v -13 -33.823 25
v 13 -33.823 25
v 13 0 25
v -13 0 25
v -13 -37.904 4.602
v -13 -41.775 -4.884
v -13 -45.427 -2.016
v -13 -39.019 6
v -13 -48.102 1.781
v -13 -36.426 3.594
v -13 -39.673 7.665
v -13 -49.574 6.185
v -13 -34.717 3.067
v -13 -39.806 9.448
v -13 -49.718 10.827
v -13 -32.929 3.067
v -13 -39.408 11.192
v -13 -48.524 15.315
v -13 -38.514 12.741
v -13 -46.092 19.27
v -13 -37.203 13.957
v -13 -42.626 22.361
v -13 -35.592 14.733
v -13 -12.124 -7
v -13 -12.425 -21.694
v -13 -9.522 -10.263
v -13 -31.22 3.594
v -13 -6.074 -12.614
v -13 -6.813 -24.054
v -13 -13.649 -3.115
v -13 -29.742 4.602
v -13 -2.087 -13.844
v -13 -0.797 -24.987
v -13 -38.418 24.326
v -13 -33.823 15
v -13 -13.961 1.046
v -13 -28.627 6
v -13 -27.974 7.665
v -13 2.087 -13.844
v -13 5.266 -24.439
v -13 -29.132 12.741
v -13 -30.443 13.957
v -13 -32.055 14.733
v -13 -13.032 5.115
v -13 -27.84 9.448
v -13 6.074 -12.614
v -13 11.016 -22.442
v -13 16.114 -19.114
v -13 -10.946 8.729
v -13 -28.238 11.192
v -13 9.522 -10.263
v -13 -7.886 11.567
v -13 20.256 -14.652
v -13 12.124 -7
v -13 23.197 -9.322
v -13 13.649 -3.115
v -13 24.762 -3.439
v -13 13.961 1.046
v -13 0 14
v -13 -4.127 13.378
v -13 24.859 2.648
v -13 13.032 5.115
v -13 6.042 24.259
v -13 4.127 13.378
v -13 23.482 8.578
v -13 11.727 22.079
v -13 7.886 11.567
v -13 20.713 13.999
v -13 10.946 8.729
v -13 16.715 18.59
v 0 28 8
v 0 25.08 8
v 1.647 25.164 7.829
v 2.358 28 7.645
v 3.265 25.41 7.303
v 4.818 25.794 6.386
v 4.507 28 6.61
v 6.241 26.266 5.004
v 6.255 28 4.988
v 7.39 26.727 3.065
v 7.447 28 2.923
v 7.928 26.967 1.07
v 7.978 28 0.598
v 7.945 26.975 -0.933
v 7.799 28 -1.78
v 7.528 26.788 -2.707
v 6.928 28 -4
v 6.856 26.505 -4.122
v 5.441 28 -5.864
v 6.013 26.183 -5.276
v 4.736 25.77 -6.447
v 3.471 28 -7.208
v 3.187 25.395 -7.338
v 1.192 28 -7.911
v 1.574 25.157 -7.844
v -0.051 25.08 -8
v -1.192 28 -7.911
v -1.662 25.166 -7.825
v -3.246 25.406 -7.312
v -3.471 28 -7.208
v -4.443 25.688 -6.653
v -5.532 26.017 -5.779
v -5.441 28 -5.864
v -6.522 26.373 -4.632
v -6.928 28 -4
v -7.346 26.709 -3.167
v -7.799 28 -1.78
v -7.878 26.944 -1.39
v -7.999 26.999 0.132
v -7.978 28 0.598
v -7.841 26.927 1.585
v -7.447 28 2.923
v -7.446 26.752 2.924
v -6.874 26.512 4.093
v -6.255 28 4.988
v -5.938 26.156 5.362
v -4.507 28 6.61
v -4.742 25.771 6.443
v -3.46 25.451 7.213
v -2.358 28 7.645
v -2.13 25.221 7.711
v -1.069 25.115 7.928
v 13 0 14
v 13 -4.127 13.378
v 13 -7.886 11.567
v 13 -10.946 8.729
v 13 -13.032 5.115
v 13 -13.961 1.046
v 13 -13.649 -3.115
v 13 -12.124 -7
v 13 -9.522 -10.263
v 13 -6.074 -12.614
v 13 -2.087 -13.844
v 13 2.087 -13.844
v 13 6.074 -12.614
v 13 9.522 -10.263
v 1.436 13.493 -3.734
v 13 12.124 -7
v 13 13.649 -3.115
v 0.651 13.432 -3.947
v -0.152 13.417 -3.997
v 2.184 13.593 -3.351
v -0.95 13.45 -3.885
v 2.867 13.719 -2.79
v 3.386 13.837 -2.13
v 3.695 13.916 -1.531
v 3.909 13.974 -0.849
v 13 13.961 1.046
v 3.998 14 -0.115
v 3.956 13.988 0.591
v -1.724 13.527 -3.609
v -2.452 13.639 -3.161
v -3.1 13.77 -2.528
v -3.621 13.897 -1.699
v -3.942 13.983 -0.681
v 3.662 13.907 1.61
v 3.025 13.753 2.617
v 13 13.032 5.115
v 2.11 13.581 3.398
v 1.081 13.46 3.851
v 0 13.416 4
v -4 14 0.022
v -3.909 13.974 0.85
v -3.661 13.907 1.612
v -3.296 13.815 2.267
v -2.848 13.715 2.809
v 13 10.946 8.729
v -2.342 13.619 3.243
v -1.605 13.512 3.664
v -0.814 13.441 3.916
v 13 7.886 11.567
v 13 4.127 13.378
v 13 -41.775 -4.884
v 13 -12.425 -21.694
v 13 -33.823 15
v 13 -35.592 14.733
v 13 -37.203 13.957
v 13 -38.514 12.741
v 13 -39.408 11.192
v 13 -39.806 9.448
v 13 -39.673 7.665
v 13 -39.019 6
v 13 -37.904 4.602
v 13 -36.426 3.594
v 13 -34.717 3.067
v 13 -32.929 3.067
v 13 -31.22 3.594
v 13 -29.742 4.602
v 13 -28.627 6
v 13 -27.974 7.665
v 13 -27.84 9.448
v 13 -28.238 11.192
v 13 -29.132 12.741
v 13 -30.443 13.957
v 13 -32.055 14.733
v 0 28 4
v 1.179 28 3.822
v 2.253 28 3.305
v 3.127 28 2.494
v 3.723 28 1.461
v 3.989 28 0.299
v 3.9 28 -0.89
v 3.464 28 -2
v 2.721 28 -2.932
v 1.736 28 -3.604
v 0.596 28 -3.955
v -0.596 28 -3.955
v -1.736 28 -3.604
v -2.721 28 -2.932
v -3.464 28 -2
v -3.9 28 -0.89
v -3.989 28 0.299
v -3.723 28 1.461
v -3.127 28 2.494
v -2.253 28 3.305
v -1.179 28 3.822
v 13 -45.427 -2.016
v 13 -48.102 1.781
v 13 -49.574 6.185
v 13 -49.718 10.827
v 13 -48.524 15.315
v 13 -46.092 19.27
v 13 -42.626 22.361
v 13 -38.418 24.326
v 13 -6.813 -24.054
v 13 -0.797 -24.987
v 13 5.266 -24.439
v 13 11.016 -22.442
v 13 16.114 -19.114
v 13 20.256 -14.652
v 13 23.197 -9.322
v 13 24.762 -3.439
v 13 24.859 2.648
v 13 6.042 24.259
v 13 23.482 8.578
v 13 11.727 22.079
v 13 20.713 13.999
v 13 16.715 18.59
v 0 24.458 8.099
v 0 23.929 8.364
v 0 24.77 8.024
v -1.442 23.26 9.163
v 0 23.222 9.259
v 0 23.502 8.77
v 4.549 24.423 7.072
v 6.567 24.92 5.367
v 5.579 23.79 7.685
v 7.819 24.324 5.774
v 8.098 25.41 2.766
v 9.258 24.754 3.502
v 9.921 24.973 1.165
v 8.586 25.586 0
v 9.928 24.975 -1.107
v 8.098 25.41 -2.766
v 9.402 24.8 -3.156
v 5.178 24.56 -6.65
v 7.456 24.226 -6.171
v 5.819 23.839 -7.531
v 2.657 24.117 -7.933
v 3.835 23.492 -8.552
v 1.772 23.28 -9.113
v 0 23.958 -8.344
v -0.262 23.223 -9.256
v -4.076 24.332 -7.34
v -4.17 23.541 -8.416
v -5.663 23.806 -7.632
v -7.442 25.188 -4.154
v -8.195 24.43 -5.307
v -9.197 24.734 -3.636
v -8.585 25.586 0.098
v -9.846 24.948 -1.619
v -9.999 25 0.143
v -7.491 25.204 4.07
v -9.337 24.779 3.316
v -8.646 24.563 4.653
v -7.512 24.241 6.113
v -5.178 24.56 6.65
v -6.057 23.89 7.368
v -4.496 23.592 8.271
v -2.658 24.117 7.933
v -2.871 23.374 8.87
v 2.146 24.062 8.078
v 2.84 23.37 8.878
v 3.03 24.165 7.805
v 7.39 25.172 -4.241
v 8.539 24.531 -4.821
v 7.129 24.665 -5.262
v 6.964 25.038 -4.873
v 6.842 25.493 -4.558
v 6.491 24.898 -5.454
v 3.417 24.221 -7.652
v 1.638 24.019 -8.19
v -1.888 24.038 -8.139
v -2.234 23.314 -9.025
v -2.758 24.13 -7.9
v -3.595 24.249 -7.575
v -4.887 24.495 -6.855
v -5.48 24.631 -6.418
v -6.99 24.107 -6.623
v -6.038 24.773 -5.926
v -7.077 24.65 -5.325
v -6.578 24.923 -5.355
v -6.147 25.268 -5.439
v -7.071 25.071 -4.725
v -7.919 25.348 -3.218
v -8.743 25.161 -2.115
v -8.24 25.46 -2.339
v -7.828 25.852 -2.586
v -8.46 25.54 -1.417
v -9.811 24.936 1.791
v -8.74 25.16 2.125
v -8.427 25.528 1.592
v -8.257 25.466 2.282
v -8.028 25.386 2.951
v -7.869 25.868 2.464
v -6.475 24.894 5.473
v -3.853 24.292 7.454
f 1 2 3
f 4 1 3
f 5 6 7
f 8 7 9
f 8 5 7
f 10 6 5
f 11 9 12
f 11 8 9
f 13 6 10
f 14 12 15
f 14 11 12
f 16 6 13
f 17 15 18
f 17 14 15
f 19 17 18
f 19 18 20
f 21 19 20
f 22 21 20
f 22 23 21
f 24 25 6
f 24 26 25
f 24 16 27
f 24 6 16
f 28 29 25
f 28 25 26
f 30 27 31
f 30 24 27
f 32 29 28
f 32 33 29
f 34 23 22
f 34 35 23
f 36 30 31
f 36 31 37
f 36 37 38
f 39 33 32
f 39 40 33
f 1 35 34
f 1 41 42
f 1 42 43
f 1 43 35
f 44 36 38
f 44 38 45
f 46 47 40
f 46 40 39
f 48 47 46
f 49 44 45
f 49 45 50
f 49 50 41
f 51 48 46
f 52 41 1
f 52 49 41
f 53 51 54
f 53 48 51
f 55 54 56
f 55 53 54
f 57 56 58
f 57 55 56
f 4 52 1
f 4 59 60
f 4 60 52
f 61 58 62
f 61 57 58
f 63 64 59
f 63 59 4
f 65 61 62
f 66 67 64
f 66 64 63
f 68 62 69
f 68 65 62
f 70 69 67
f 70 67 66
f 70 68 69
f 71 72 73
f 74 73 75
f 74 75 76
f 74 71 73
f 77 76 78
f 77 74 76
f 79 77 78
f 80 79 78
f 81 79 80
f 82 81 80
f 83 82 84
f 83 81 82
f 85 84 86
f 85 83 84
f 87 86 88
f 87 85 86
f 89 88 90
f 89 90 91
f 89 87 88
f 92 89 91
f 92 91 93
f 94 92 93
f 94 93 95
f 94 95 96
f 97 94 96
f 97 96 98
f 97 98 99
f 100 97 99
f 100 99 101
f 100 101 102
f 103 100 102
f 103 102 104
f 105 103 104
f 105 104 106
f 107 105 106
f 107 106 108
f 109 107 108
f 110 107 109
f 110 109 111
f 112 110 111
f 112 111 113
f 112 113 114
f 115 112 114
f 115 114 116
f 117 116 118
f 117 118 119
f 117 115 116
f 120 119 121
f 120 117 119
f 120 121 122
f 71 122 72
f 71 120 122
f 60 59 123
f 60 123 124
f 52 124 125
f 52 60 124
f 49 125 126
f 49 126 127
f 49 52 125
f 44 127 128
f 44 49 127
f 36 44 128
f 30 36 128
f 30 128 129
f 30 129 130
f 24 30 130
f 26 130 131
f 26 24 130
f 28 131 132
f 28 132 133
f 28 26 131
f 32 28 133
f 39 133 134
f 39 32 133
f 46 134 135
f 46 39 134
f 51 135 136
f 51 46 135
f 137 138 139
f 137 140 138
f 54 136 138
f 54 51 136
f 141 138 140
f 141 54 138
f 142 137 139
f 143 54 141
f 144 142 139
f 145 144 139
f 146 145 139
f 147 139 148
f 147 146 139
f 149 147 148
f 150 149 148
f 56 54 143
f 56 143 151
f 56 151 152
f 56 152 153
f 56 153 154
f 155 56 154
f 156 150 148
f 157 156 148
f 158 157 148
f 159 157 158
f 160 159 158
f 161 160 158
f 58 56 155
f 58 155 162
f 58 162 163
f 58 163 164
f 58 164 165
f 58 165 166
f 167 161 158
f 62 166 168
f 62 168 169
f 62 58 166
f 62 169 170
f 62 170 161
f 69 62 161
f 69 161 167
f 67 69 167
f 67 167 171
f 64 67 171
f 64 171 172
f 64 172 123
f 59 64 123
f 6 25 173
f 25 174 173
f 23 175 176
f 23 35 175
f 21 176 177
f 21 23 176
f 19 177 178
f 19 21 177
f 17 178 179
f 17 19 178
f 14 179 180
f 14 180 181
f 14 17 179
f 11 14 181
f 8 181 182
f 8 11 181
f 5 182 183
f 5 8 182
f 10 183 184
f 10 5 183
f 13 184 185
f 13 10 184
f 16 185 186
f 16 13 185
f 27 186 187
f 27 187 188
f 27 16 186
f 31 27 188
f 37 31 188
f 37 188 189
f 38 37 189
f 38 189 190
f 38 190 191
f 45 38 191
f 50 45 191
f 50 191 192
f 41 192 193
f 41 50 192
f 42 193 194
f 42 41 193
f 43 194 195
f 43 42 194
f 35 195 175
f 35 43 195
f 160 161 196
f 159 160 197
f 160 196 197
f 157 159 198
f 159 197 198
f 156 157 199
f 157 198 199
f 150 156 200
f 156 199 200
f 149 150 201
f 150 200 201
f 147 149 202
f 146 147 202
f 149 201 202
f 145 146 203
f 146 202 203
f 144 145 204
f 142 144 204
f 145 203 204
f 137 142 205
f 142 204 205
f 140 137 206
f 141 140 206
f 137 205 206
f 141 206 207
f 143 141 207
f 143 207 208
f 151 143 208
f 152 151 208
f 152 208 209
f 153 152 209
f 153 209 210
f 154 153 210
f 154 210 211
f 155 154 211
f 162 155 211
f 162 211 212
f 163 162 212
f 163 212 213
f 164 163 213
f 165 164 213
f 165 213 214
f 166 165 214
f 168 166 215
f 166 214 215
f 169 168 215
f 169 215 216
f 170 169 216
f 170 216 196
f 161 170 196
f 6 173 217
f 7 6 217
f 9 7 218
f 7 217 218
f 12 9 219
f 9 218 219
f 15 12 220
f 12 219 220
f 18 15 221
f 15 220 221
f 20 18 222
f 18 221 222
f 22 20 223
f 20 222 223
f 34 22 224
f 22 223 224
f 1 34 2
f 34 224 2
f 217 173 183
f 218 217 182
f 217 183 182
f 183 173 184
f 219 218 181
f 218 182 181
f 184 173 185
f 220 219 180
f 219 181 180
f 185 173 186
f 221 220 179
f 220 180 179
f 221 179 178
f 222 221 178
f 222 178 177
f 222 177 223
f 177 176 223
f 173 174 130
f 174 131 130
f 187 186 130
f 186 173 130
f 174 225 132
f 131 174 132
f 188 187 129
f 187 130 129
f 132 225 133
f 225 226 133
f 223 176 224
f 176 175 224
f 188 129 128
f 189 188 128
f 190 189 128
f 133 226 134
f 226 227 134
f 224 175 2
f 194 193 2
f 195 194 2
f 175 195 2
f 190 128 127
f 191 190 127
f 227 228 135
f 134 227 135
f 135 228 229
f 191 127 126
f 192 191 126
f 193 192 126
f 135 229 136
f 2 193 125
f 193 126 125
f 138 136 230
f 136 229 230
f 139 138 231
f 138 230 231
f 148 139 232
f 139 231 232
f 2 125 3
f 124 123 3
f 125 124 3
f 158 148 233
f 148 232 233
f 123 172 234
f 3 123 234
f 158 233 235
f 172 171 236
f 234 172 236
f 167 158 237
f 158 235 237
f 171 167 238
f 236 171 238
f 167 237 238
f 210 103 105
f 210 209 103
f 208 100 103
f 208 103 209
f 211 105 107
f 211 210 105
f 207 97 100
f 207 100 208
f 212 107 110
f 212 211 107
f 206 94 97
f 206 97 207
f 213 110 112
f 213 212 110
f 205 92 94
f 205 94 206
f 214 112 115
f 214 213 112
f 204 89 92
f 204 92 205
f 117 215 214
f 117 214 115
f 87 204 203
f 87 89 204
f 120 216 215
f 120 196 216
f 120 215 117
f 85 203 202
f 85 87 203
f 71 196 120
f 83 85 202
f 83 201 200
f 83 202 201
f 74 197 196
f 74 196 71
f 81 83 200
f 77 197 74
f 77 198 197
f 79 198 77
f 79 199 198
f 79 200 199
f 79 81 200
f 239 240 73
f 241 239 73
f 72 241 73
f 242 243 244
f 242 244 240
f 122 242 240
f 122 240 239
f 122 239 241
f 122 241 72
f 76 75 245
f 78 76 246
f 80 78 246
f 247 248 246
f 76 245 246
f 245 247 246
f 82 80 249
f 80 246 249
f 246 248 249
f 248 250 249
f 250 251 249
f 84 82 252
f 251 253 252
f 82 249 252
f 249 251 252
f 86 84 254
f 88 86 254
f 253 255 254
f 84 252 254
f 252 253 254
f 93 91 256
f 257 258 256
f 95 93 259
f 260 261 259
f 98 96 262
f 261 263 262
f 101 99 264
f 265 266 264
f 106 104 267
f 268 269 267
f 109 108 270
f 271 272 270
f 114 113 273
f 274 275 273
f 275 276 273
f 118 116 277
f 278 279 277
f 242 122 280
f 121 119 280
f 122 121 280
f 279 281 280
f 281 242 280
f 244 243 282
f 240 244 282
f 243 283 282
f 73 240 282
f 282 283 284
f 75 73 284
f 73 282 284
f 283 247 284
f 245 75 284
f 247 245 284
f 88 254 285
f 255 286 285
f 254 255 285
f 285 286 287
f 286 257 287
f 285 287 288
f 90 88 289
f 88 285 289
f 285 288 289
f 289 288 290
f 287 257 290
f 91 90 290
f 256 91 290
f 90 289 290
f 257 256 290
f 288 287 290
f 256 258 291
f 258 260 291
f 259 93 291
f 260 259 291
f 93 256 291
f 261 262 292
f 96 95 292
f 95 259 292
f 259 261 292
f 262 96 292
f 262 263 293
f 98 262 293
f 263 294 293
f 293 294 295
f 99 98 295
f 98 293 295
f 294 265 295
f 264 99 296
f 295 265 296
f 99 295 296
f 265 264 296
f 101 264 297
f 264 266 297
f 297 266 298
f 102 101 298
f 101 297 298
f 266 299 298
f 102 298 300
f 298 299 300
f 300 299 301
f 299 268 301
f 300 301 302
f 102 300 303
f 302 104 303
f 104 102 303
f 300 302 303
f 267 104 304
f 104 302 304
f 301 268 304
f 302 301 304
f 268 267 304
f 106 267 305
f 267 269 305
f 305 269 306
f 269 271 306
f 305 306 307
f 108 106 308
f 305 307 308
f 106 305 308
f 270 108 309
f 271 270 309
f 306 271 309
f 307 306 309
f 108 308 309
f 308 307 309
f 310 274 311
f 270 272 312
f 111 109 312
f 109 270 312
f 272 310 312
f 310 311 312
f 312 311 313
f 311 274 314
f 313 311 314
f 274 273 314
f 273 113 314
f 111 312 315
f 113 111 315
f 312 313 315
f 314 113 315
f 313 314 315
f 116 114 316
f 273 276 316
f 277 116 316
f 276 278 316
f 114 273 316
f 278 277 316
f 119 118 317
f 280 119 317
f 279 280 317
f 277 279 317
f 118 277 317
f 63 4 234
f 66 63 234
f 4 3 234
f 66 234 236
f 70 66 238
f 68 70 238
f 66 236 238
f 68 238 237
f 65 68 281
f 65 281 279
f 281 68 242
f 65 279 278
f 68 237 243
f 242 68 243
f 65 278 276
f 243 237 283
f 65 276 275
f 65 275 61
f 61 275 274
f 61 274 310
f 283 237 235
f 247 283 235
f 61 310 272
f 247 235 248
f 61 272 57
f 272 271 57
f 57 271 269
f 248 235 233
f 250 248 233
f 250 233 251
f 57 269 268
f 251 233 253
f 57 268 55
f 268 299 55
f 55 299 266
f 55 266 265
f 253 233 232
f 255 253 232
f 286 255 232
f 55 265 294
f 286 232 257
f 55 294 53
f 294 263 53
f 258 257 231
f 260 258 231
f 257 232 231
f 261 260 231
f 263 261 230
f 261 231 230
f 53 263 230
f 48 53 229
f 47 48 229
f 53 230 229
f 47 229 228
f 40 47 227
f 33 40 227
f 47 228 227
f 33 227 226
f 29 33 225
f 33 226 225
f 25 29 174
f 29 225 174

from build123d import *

# Parameters (mm, degrees)
SKETCH_1_R               = 14
SKETCH_1_R_2             = 6
EXTRUDE_1_DEPTH          = 13
EXTRUDE_2_REACH          = 84.767
EXTRUDE_2_END_RADIUS     = 25
SKETCH_2_R               = 8
CUT_EXTRUDE_3_REACH      = 84.767
CUT_EXTRUDE_3_END_RADIUS = 14
SKETCH_3_R               = 4
FILLET_1_R               = 2


with BuildPart() as part:
    # 草圖1 → 伸長1 (new, symmetric)
    with BuildSketch(Plane(origin=(0, 0, 0), x_dir=(0, 0, -1), z_dir=(1, 0, 0))):
        with BuildLine():
            Line((-25, -33.823069051), (-25, 0))
            ThreePointArc((-25, 0), (6.428571429, 24.159335036), (21.693877551, -12.424800876))
            Line((21.693877551, -12.424800876), (4.884081633, -41.774941611))
            ThreePointArc((4.884081633, -41.774941611), (-13.114285714, -49.285043474), (-25, -33.823069051))
        make_face()
        with Locations(Location((0, 0, 0), (0, 0, 180))):
            Circle(SKETCH_1_R, mode=Mode.SUBTRACT)
        with Locations(Location((-9, -33.823069051, 0), (0, 0, 180))):
            Circle(SKETCH_1_R_2, mode=Mode.SUBTRACT)
    extrude(amount=EXTRUDE_1_DEPTH, both=True)

    # 伸長2: up to this cylinder (the profile starts outside it)
    extrude_2_end = Plane(origin=(0, 0, 0), z_dir=(-1, 0, 0)) * Cylinder(EXTRUDE_2_END_RADIUS, 220.534, mode=Mode.PRIVATE)
    # 草圖2 → 伸長2 (add, up to the surface)
    with BuildSketch(Plane(origin=(0, 28, 0), x_dir=(-1, 0, 0), z_dir=(0, 1, 0)), mode=Mode.PRIVATE) as extrude_2_sk1:
        with Locations(Location((0, 0, 0), (0, 0, 90))):
            Circle(SKETCH_2_R)
    extrude_2_tool1 = extrude(extrude_2_sk1.sketch, amount=-EXTRUDE_2_REACH, mode=Mode.PRIVATE) - extrude_2_end
    add(extrude_2_tool1.solids().sort_by_distance((0, 28, 0))[0])

    # 伸長3: up to this cylinder (the profile starts outside it)
    cut_extrude_3_end = Plane(origin=(0, 0, 0), z_dir=(-1, 0, 0)) * Cylinder(CUT_EXTRUDE_3_END_RADIUS, 198.534, mode=Mode.PRIVATE)
    # 草圖3 → 伸長3 (cut, up to the surface)
    with BuildSketch(Plane(origin=(0, 28, 0), x_dir=(1, 0, 0), z_dir=(0, 1, 0)), mode=Mode.PRIVATE) as cut_extrude_3_sk1:
        with Locations(Location((0, 0, 0), (0, 0, 270))):
            Circle(SKETCH_3_R)
    cut_extrude_3_tool1 = extrude(cut_extrude_3_sk1.sketch, amount=-CUT_EXTRUDE_3_REACH, mode=Mode.PRIVATE) - cut_extrude_3_end
    add(cut_extrude_3_tool1.solids().sort_by_distance((0, 28, 0))[0], mode=Mode.SUBTRACT)

    # 圓角1
    fillet_1_edges = [part.edges().sort_by_distance(p)[0] for p in [
        (0, 23.685438565, -8),
    ]]
    fillet(fillet_1_edges, radius=FILLET_1_R)


solid = part.part
